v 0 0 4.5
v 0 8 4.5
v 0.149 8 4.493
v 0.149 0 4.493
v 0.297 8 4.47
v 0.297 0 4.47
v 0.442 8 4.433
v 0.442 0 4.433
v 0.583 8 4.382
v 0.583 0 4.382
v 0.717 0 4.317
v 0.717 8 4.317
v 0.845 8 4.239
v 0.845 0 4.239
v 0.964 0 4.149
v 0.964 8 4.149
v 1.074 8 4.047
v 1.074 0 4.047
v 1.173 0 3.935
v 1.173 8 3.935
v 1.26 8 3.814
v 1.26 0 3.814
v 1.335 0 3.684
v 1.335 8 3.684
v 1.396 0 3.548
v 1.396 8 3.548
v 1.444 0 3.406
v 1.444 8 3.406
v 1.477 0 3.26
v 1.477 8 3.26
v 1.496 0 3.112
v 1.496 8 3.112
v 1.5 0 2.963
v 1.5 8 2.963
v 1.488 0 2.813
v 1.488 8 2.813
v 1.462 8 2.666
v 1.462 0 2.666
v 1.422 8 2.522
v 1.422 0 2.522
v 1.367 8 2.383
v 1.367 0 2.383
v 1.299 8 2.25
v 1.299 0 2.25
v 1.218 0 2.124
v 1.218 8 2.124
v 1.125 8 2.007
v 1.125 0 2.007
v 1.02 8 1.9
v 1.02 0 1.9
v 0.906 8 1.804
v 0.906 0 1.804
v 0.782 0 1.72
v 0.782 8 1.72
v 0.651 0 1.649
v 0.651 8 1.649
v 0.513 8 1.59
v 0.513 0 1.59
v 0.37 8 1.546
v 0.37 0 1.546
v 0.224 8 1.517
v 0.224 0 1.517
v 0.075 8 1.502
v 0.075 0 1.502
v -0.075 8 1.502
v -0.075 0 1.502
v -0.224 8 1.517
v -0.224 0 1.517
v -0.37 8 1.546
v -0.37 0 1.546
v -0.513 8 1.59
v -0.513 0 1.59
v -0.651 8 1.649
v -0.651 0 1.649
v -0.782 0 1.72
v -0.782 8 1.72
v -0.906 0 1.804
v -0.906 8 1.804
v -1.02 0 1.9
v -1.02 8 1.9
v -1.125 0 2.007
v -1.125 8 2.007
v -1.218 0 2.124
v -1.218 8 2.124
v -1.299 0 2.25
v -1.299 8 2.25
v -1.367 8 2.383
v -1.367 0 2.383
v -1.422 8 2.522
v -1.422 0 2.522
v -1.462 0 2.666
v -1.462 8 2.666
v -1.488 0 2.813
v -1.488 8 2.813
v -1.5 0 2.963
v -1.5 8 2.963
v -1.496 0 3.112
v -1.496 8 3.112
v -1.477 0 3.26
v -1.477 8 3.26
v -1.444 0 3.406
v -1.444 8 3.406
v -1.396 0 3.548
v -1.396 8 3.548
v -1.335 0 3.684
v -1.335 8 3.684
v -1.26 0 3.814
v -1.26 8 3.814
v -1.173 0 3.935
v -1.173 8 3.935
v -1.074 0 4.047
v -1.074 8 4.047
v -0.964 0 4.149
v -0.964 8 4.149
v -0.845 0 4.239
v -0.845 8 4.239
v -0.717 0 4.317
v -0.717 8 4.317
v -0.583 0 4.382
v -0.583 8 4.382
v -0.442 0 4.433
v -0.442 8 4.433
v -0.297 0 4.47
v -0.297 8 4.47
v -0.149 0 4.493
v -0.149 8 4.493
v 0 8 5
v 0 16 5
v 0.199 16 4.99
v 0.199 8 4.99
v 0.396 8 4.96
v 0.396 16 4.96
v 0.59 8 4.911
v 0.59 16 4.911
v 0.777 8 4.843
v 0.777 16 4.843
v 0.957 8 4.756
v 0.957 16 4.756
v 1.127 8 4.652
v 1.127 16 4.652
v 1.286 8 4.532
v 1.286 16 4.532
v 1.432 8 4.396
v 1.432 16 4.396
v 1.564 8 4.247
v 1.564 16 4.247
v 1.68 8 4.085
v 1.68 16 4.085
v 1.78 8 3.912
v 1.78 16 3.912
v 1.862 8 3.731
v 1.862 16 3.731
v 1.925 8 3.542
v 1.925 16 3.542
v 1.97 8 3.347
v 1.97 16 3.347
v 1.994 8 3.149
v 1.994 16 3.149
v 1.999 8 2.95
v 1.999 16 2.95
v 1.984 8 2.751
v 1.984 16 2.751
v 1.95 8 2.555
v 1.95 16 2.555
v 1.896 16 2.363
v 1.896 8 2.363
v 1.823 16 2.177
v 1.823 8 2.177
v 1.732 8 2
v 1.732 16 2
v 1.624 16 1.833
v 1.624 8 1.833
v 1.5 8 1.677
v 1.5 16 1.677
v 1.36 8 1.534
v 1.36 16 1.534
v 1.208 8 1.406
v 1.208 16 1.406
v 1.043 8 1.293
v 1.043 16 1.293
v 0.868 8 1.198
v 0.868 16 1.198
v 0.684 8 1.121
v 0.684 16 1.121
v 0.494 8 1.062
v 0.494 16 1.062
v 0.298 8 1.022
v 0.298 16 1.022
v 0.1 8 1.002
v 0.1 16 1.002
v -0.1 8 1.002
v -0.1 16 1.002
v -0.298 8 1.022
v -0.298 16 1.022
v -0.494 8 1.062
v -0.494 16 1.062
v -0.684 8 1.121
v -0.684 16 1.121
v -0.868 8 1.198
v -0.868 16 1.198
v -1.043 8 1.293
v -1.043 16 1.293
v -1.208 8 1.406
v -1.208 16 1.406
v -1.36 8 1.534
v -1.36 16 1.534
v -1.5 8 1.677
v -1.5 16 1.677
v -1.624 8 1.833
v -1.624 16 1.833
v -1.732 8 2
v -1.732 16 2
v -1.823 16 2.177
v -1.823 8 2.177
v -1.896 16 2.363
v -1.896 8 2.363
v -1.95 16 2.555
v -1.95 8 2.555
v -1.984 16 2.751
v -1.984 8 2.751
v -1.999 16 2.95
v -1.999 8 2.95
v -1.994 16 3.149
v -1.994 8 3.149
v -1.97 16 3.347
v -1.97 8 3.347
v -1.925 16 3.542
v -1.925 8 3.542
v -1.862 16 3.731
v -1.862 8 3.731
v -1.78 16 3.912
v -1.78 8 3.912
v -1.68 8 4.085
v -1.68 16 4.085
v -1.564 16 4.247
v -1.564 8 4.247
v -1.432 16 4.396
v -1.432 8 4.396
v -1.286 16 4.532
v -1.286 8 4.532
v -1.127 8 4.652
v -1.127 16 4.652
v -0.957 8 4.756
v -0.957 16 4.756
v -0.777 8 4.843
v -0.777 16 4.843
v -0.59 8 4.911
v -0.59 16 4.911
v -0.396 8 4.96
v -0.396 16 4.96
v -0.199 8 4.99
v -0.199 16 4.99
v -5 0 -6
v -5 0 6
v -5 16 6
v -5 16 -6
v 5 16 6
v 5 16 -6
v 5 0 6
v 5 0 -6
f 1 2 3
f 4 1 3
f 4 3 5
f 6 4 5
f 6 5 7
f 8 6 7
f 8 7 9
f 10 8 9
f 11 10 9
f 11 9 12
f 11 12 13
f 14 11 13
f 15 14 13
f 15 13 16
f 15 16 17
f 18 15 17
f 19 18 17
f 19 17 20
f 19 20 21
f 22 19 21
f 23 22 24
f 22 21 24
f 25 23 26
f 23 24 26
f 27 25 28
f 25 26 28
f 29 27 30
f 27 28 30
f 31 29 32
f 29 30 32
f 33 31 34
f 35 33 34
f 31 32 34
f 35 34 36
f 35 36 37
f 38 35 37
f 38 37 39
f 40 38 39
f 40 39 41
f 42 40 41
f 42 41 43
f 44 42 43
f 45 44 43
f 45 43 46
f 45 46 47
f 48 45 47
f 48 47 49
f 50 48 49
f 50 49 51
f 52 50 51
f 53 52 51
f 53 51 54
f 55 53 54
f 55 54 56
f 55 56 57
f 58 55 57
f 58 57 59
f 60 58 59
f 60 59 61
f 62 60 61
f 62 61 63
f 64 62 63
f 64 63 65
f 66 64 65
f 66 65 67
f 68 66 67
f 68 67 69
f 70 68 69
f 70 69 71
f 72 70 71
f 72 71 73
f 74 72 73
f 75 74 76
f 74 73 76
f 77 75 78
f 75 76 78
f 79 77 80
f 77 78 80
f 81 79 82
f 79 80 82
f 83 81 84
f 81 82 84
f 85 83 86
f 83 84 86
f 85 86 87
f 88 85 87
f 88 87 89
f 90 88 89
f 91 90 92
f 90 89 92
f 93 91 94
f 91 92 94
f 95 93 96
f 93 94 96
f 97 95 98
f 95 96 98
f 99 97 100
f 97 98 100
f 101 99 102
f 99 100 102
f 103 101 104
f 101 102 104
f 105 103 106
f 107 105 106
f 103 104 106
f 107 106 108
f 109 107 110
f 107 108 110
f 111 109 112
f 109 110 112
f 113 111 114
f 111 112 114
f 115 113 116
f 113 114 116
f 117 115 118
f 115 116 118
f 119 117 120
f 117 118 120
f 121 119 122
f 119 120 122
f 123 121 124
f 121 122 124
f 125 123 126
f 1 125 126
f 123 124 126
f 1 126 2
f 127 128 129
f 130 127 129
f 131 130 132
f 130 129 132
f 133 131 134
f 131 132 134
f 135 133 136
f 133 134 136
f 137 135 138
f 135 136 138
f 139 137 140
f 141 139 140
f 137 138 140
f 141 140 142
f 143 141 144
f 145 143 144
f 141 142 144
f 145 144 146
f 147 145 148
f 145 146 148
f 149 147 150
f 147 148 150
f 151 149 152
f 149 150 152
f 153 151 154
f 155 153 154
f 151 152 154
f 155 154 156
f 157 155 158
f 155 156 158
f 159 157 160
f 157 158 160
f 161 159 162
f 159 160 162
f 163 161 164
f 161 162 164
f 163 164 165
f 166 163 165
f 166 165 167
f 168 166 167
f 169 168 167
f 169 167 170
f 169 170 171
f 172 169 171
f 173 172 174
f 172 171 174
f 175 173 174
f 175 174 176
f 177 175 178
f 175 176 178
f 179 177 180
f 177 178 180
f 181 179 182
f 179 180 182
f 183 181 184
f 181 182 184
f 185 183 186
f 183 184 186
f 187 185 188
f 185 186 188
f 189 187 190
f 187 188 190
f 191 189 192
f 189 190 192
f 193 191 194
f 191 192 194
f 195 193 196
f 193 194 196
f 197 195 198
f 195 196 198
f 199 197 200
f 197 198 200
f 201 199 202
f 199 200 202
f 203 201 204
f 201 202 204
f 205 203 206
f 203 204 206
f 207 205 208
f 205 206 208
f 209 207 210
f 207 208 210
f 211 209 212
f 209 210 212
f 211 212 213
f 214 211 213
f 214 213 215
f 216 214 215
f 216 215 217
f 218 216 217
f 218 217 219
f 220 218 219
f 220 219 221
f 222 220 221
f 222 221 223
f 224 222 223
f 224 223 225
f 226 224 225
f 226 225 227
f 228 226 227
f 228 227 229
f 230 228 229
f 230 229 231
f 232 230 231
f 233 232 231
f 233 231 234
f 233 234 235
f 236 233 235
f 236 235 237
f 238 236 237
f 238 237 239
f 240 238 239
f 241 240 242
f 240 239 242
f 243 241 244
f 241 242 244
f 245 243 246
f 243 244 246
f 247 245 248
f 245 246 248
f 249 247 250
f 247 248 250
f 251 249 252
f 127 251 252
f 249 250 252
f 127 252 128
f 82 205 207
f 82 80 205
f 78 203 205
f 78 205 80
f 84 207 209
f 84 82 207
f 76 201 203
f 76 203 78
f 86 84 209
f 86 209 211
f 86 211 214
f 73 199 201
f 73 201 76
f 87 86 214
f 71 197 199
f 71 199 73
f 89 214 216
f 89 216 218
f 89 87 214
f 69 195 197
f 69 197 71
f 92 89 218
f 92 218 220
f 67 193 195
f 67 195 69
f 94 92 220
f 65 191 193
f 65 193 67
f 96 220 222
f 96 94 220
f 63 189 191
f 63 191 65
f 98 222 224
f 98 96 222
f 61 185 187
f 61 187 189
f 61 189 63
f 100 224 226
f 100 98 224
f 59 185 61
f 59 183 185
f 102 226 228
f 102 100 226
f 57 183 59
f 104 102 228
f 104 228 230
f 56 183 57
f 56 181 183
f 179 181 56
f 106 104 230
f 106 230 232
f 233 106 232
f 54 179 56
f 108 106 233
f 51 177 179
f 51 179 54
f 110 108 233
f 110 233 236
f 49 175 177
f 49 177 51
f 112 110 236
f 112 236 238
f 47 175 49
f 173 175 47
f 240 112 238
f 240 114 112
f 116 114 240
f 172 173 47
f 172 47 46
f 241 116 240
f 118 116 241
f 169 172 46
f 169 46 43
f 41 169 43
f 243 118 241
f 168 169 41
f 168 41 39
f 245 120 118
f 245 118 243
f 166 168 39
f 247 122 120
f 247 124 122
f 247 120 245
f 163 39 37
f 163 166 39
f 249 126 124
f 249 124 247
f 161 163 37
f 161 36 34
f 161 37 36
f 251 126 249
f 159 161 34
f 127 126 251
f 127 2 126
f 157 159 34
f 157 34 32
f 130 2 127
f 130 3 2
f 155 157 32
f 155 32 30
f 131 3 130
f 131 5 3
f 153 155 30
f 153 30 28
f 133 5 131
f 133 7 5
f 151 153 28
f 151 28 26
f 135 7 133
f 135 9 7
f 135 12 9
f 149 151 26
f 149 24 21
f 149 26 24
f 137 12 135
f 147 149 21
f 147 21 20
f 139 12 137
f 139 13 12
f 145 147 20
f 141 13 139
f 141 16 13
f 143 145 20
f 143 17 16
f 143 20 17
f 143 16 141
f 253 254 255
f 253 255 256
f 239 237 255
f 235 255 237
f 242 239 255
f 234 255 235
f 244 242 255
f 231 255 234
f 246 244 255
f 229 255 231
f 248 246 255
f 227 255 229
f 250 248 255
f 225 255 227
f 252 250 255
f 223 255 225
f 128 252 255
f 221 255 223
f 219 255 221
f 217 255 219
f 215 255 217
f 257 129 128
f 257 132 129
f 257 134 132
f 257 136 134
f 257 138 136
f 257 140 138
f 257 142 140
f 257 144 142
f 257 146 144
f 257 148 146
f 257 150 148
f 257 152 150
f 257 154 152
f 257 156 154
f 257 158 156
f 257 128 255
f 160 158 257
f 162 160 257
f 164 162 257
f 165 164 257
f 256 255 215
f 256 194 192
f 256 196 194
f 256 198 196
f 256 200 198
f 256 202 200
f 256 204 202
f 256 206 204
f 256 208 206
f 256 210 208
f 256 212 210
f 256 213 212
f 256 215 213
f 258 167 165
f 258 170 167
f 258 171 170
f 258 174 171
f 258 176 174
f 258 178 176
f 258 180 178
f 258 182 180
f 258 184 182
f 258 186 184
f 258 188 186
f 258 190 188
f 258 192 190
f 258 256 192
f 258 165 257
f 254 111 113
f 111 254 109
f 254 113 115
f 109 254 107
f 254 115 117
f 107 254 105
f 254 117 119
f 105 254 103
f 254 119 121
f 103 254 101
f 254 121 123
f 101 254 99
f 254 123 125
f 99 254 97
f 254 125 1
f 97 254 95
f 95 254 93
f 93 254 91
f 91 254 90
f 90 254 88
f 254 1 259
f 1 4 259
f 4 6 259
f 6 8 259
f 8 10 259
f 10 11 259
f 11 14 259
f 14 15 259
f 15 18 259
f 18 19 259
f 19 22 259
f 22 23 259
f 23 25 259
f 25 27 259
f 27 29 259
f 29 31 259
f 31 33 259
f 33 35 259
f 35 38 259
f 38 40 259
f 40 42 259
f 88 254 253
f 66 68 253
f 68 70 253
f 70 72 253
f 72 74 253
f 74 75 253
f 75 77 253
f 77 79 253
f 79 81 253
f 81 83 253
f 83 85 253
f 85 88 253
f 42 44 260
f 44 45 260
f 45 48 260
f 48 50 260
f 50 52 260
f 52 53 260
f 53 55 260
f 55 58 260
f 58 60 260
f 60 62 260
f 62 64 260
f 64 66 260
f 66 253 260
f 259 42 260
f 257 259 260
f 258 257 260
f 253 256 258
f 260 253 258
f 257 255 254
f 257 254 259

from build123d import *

# Parameters (mm, degrees)
SKETCH1_W           = 10
SKETCH1_H           = 12
BOSS_EXTRUDE1_DEPTH = 16
SKETCH2_R           = 1.5
CUT_EXTRUDE1_DEPTH  = 16
SKETCH2_3_R         = 2
CUT_EXTRUDE2_DEPTH  = 8


with BuildPart() as part:
    # Sketch1 → Boss-Extrude1 (new body)
    with BuildSketch(Plane(origin=(0, 0, 0), x_dir=(1, 0, 0), z_dir=(0, 1, 0))):
        Rectangle(SKETCH1_W, SKETCH1_H)
    extrude(amount=BOSS_EXTRUDE1_DEPTH)

    # Sketch2 → Cut-Extrude1 (cut)
    with BuildSketch(Plane(origin=(0, 16, 0), x_dir=(1, 0, 0), z_dir=(0, 1, 0))):
        with Locations((0, -3)):
            Circle(SKETCH2_R)
    extrude(amount=-CUT_EXTRUDE1_DEPTH, mode=Mode.SUBTRACT)

    # Sketch2<3> → Cut-Extrude2 (cut)
    with BuildSketch(Plane(origin=(0, 16, 0), x_dir=(1, 0, 0), z_dir=(0, 1, 0))):
        with Locations((0, -3)):
            Circle(SKETCH2_3_R)
    extrude(amount=-CUT_EXTRUDE2_DEPTH, mode=Mode.SUBTRACT)


solid = part.part
